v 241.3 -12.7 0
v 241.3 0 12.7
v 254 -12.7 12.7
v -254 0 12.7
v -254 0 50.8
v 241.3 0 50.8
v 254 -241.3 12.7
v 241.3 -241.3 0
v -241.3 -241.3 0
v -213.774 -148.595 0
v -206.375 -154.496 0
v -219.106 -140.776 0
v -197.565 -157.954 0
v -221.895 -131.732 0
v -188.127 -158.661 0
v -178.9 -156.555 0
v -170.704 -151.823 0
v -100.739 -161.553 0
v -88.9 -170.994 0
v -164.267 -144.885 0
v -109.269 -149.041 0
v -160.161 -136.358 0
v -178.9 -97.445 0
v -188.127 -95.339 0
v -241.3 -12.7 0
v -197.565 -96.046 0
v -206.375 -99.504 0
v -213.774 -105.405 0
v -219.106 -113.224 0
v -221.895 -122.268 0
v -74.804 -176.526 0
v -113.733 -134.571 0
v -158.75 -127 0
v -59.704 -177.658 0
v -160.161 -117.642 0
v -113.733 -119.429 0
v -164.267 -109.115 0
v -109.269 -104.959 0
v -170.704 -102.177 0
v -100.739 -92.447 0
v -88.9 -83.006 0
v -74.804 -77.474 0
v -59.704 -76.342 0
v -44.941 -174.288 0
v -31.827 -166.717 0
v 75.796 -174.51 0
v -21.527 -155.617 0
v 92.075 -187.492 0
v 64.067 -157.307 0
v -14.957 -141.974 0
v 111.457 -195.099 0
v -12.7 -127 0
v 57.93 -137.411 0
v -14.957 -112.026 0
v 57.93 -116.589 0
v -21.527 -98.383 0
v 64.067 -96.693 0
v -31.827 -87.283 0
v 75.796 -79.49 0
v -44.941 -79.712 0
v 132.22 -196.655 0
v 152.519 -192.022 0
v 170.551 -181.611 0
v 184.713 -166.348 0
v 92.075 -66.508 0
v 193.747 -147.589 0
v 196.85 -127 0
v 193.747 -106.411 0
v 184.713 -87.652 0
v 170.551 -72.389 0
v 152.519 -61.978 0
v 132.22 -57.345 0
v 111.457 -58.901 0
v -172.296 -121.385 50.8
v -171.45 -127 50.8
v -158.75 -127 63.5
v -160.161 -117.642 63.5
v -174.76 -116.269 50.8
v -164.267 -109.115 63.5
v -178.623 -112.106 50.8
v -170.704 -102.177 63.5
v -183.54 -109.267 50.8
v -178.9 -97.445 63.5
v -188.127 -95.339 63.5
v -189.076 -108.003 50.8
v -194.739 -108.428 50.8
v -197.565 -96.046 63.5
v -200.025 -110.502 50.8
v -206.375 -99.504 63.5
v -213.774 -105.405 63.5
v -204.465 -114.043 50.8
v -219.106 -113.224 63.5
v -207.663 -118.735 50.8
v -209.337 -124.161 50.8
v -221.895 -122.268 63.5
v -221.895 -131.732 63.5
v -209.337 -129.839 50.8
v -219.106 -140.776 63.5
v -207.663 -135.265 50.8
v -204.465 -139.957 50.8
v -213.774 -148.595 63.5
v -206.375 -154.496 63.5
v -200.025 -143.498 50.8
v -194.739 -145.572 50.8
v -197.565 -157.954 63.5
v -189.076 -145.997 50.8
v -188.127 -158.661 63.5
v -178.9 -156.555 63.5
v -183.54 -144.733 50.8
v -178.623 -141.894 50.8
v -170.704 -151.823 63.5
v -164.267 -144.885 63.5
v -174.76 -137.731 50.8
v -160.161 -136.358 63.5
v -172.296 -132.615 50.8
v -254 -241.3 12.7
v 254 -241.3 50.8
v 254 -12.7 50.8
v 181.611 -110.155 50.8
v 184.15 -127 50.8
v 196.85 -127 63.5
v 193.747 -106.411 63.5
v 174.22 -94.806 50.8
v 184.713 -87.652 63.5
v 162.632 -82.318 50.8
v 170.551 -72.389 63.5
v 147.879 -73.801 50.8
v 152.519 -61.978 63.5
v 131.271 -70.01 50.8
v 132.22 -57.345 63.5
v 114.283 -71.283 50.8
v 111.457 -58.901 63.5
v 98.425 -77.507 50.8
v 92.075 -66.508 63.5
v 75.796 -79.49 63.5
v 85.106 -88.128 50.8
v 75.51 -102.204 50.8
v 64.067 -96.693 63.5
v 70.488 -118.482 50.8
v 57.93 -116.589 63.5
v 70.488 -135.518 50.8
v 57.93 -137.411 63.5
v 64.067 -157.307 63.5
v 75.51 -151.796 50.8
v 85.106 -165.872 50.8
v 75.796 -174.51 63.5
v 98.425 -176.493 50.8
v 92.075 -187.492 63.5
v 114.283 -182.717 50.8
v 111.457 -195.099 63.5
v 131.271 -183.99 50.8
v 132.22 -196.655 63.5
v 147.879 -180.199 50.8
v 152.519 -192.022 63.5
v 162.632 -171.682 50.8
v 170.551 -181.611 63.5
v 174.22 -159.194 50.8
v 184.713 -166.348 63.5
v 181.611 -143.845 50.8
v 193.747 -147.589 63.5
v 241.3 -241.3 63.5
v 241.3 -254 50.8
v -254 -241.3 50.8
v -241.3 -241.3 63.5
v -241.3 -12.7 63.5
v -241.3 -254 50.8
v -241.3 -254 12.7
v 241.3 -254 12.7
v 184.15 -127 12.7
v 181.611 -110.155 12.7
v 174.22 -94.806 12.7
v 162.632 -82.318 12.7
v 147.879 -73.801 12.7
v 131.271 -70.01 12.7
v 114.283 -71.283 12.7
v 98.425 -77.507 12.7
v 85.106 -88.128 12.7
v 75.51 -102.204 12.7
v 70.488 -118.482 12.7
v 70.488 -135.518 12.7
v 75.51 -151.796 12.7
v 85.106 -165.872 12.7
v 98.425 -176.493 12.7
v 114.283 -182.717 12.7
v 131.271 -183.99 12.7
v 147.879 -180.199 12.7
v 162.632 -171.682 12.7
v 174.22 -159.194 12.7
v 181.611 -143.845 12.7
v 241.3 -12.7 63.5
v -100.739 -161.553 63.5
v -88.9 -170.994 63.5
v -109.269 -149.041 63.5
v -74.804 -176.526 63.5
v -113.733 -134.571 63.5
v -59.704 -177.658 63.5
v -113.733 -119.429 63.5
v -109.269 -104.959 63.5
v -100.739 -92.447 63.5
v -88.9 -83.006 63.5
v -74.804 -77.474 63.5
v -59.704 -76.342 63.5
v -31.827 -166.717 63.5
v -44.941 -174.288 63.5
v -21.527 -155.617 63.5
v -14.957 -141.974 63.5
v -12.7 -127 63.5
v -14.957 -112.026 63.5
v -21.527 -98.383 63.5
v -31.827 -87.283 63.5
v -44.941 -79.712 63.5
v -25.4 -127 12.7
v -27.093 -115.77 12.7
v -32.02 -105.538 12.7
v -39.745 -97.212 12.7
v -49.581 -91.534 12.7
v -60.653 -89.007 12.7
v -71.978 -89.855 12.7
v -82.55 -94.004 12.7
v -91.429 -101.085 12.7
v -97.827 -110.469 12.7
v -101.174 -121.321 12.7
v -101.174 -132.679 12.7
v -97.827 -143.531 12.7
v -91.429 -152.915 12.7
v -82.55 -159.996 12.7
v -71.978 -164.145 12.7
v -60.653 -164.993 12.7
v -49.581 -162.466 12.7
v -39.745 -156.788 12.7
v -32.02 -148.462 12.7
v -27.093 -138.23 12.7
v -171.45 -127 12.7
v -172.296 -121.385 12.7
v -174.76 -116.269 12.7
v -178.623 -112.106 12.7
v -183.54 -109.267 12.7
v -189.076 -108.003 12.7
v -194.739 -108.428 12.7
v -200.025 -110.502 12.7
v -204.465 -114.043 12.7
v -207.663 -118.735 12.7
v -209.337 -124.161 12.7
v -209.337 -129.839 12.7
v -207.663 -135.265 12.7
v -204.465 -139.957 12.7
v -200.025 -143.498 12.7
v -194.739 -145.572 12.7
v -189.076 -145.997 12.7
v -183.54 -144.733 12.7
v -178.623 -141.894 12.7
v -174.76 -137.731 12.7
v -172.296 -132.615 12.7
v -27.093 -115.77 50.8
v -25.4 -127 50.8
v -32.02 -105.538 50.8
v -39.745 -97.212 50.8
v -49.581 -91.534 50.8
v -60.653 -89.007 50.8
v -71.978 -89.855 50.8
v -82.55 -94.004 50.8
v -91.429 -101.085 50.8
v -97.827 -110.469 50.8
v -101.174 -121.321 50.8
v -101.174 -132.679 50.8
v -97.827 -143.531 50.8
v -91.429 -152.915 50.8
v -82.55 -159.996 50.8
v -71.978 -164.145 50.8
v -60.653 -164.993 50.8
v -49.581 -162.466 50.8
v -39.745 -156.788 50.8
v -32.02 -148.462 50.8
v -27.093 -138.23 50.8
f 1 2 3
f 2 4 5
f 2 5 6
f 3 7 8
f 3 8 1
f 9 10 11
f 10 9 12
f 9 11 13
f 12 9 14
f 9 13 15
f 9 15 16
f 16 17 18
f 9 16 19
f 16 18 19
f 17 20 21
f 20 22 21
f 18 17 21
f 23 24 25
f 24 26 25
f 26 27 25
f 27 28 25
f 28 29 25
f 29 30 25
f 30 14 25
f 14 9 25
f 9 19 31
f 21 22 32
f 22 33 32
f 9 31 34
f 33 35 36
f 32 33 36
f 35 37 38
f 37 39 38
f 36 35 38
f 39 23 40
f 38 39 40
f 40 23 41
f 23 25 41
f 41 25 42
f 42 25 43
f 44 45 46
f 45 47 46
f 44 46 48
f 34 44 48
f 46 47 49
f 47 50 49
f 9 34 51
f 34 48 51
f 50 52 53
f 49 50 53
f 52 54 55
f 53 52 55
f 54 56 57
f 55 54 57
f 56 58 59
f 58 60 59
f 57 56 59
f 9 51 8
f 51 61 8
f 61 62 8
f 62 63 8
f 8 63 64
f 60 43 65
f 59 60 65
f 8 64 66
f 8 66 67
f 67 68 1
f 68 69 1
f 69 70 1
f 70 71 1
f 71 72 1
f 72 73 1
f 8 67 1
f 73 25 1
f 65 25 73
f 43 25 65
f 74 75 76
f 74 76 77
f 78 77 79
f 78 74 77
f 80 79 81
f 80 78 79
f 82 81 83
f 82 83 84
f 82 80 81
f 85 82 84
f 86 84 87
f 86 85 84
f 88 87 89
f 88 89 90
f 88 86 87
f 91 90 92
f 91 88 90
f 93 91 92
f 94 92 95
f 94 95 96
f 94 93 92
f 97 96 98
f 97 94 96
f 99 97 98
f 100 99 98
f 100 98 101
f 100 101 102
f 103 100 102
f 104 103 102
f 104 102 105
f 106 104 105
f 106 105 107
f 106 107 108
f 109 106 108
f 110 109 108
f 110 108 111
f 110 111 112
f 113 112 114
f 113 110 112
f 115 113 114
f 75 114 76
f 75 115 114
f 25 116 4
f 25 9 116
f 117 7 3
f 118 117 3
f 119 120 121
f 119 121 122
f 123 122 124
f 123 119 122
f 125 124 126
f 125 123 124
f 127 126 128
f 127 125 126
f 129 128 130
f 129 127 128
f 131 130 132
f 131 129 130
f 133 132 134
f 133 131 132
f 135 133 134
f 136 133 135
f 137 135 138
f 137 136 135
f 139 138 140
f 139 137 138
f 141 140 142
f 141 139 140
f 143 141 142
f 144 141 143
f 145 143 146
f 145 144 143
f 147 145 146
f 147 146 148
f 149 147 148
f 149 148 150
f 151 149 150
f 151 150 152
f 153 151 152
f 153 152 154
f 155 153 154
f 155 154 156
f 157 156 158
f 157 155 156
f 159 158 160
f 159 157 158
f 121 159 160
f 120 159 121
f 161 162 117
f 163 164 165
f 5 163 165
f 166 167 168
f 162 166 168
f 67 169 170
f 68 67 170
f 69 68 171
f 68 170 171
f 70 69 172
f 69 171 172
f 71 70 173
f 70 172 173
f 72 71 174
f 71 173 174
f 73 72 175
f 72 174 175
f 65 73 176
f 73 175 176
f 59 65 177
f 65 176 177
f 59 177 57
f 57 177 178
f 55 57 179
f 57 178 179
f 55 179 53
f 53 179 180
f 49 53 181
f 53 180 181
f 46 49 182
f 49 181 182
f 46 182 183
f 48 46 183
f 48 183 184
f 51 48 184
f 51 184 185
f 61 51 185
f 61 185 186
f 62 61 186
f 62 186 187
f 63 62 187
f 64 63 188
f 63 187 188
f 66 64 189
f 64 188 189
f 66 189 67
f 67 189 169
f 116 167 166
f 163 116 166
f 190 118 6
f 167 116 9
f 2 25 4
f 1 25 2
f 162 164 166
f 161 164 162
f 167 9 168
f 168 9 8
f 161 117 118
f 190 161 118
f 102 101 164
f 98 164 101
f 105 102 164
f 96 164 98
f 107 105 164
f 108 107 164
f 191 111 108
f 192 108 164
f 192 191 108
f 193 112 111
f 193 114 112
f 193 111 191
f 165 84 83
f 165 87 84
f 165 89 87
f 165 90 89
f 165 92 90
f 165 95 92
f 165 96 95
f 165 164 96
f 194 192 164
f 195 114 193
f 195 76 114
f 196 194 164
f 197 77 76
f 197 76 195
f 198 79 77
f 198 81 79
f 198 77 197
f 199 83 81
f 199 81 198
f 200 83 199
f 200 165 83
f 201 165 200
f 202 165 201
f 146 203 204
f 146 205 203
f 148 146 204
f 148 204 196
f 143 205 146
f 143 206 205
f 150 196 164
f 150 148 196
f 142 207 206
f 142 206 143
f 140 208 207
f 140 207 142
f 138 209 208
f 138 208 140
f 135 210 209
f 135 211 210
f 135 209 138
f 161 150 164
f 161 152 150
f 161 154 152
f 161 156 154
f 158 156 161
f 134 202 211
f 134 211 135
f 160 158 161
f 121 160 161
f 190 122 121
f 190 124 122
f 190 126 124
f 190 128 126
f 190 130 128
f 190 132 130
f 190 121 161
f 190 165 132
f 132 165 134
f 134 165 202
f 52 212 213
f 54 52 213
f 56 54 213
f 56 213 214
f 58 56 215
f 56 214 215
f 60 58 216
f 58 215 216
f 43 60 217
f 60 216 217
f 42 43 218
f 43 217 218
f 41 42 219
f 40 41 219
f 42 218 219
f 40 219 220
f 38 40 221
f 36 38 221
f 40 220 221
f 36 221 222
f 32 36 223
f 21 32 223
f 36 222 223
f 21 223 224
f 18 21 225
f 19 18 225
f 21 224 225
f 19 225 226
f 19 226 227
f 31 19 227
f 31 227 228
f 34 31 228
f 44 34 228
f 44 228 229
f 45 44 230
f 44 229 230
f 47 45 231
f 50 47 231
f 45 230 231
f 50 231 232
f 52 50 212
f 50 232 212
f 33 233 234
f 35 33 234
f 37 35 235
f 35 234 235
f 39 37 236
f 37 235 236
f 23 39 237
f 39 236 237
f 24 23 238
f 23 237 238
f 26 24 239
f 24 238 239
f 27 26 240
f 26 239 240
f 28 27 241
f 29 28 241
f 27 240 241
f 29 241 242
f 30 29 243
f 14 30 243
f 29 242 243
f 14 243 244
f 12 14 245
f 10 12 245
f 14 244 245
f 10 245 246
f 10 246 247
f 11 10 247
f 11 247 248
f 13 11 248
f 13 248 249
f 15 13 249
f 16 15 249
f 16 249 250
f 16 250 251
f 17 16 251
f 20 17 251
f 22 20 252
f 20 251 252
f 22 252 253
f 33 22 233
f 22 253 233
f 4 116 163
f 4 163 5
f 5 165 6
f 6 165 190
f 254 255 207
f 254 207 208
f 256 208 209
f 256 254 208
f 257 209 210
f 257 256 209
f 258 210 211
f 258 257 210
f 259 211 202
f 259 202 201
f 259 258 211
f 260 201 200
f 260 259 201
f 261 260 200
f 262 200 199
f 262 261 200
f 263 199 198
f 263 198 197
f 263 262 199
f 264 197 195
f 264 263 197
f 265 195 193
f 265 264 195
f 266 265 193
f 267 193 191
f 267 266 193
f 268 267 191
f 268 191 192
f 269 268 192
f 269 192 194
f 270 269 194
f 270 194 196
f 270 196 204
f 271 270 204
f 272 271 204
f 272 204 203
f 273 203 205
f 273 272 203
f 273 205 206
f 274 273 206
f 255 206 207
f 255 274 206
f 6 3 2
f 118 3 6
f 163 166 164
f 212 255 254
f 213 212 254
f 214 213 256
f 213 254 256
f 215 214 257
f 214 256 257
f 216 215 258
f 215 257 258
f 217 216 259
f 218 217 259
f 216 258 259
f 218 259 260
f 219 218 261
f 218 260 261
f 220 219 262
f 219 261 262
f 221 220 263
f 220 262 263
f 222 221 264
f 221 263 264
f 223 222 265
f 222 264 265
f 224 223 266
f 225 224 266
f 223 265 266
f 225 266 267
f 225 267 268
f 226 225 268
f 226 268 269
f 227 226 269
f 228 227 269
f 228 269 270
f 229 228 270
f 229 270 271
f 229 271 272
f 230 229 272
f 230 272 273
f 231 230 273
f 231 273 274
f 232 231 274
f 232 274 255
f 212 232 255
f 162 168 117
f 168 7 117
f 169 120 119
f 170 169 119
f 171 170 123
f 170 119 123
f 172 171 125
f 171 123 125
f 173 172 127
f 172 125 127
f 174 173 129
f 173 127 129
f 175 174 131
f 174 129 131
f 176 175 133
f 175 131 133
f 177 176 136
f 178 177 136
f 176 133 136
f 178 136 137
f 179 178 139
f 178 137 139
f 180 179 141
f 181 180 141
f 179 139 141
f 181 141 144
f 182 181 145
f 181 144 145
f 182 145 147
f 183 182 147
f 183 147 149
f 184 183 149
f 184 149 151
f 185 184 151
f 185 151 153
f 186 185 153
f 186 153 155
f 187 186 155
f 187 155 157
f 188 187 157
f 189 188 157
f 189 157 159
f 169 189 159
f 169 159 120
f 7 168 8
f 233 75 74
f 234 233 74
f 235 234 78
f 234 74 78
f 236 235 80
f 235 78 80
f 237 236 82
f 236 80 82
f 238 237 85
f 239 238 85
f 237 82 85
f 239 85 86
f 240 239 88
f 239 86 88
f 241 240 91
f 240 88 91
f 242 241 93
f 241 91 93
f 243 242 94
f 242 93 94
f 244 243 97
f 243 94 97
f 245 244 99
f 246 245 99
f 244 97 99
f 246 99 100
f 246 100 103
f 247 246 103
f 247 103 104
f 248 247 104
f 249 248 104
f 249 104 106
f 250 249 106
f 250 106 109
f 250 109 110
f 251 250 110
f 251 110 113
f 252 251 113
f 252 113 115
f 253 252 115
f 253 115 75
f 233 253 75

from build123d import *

# Parameters (mm, degrees)
F1_W          = 508
F1_H          = 254
F2_DEPTH      = 63.5
F4_R          = 38.1
F5_DEPTH      = 127
F5_DEPTH_BACK = 127
F6_R          = 57.15
F7_DEPTH      = 127
F7_DEPTH_BACK = 127
F3_R          = 19.05
F8_DEPTH      = 127
F9_SIZE2      = 12.7
F9_SIZE       = 12.7


with BuildPart() as f2:
    # F1 (on face) → F2 (new body)
    with BuildSketch(Plane.XY):
        with Locations((0, -127)):
            Rectangle(F1_W, F1_H)
    extrude(amount=F2_DEPTH)

    # F4 (on face) → F5 (cut, two sides)
    with BuildSketch(Plane.XY.offset(63.5)) as f5_sk:
        with Locations((-63.5, -127)):
            Circle(F4_R)
    extrude(amount=F5_DEPTH, mode=Mode.SUBTRACT)
    extrude(f5_sk.sketch, amount=-F5_DEPTH_BACK, mode=Mode.SUBTRACT)

    # F6 (on face) → F7 (cut, two sides)
    with BuildSketch(Plane.XY.offset(63.5)) as f7_sk:
        with Locations((127, -127)):
            Circle(F6_R)
    extrude(amount=F7_DEPTH, mode=Mode.SUBTRACT)
    extrude(f7_sk.sketch, amount=-F7_DEPTH_BACK, mode=Mode.SUBTRACT)

    # F3 (on face) → F8 (cut)
    with BuildSketch(Plane.XY.offset(63.5)):
        with Locations((-190.5, -127)):
            Circle(F3_R)
    extrude(amount=-F8_DEPTH, mode=Mode.SUBTRACT)

    # F9
    f9_edges = [f2.edges().sort_by_distance(p)[0] for p in [
        (-254, -127, 0),
        (0, 0, 0),
        (-254, -254, 31.75),
        (254, -254, 31.75),
        (0, -254, 0),
        (0, -254, 63.5),
        (254, 0, 31.75),
        (254, -127, 0),
        (254, -127, 63.5),
        (0, 0, 63.5),
        (-254, -127, 63.5),
        (-209.55, -127, 63.5),
        (-101.6, -127, 63.5),
        (69.85, -127, 63.5),
        (-209.55, -127, 0),
        (-101.6, -127, 0),
        (69.85, -127, 0),
    ]]
    chamfer(f9_edges, length=F9_SIZE, length2=F9_SIZE2)


solid = f2.part
